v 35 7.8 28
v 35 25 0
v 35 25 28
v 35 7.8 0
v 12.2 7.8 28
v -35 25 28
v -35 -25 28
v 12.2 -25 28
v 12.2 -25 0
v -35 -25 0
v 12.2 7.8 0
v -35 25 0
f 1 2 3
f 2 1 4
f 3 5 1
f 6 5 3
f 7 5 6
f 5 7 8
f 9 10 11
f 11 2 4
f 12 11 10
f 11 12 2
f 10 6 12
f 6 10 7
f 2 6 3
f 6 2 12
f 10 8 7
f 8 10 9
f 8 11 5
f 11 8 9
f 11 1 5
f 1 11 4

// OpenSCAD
// Two-part enclosure for small electronics board
// Print orientation: both parts on the bed, lid on +X side of box

// ---- Box ----
box_x = 70;      // outer length (X)
box_y = 50;      // outer width (Y)
box_z = 30;      // outer height (Z)
wall = 2;        // wall thickness
floor = 2;       // floor thickness

// ---- Lid ----
lip_w = 65.6;    // lip outer length (X)
lip_d = 45.6;    // lip outer width (Y)
lip_h = 4;       // lip height (wall thickness)
eps = 0.2;       // clearance between lip and box opening

// ---- Layout ----
gap = 10;        // gap between box and lid on bed
lip_t = 0.01;    // small overlap so lip fuses with plate

$fn = 64;

difference() {
    union() {
        // Box: open top, solid floor and walls
        translate([-box_x/2, -box_y/2, 0])
            cube([box_x, box_y, box_z - floor]);
    }

    // Lid: plate + lip, printed upside down (lip on top)
    translate([box_x/2 + gap, -50/2, 0])
        linear_extrude(lip_d)
            polygon([[-lip_w/2, -lip_w/2], [lip_w/2, -lip_w/2],
                     [lip_w/2, lip_w/2], [-lip_w/2, lip_w/2]]);
}
